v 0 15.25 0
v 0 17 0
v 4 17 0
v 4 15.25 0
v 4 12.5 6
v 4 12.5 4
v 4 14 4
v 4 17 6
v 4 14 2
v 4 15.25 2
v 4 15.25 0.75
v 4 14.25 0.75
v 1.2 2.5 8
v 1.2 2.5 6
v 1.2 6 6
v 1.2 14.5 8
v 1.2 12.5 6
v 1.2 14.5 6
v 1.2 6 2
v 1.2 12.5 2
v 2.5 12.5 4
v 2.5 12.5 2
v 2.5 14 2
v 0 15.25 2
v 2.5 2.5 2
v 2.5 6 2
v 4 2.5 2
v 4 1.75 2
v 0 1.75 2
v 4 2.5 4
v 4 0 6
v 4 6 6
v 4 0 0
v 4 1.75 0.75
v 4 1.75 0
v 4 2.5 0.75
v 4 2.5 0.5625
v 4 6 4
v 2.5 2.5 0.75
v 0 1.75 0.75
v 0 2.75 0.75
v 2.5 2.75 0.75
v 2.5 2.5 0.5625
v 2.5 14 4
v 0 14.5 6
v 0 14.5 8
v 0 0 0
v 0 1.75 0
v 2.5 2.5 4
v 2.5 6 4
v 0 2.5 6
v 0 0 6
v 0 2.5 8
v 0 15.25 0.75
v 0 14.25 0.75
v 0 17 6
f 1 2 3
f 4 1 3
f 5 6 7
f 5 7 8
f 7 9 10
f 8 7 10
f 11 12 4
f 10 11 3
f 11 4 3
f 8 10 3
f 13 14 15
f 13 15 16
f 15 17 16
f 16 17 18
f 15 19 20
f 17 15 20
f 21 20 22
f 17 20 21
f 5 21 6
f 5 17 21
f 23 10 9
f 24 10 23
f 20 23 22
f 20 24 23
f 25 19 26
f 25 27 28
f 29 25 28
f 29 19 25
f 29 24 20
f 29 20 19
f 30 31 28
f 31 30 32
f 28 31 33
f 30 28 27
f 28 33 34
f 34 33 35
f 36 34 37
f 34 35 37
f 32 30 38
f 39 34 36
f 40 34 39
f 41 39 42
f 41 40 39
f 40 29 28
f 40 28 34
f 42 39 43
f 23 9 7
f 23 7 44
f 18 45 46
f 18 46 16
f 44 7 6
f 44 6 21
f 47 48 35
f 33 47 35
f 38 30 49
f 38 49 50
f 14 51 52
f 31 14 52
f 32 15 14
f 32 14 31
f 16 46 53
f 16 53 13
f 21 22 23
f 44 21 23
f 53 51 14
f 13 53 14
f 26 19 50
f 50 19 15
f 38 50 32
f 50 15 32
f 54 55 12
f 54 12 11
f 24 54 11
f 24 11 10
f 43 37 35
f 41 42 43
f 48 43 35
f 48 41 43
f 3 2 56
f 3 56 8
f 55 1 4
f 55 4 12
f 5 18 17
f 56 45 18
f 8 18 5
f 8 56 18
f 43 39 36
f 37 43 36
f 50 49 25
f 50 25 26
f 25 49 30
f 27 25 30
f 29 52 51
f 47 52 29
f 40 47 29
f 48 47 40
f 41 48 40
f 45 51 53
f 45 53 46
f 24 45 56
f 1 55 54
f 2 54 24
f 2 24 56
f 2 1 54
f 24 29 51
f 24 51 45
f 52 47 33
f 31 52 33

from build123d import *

# Parameters (mm, degrees)
SKETCH1_W           = 4
SKETCH1_H           = 17
BOSS_EXTRUDE1_DEPTH = 6
SKETCH2_W           = 2.8
SKETCH2_H           = 6.5
SKETCH2_W_2         = 1.5
SKETCH2_H_2         = 2.75
CUT_EXTRUDE1_DEPTH  = 19.466185313
CUT_EXTRUDE2_DEPTH  = 19.466185313
SKETCH4_W           = 2
SKETCH4_H           = 2.75
BOSS_EXTRUDE2_DEPTH = 2
SKETCH5_W           = 1.2
SKETCH5_H           = 12
BOSS_EXTRUDE3_DEPTH = 2
SKETCH6_W           = 1.5
SKETCH6_H           = 1.5
SKETCH6_H_2         = 0.75
CUT_EXTRUDE3_DEPTH  = 2


with BuildPart() as part:
    # Sketch1 → Boss-Extrude1 (new body)
    with BuildSketch(Plane.XY):
        with Locations((2, 8.5)):
            Rectangle(SKETCH1_W, SKETCH1_H)
    extrude(amount=BOSS_EXTRUDE1_DEPTH)

    # Sketch2 → Cut-Extrude1 (cut, through all)
    with BuildSketch(Plane.XY.offset(6)):
        with Locations((2.6, 9.25)):
            Rectangle(SKETCH2_W, SKETCH2_H)
        with Locations((3.25, 3.875)):
            Rectangle(SKETCH2_W_2, SKETCH2_H_2)
    extrude(amount=-CUT_EXTRUDE1_DEPTH, mode=Mode.SUBTRACT)

    # Sketch3 → Cut-Extrude2 (cut, through all)
    with BuildSketch(Plane.ZY):
        Polygon((0, 15.25), (0.75, 14.25), (0.75, 15.25), (2, 15.25), (2, 1.75), (0.75, 1.75), (0.75, 2.75), (0, 1.75), align=None)
    extrude(amount=-CUT_EXTRUDE2_DEPTH, mode=Mode.SUBTRACT)

    # Sketch4 → Boss-Extrude2 (add)
    with BuildSketch(Plane(origin=(4, 0, 0), x_dir=(0, 0, -1), z_dir=(1, 0, 0))):
        with Locations((-5, 3.875)):
            Rectangle(SKETCH4_W, SKETCH4_H)
    extrude(amount=-BOSS_EXTRUDE2_DEPTH)

    # Sketch5 → Boss-Extrude3 (add)
    with BuildSketch(Plane.XY.offset(6)):
        with Locations((0.6, 8.5)):
            Rectangle(SKETCH5_W, SKETCH5_H)
    extrude(amount=BOSS_EXTRUDE3_DEPTH)

    # Sketch6 → Cut-Extrude3 (cut)
    with BuildSketch(Plane(origin=(0, 0, 2), x_dir=(-1, 0, 0), z_dir=(0, 0, -1))):
        with Locations((-3.25, 13.25)):
            Rectangle(SKETCH6_W, SKETCH6_H)
        with Locations((-3.25, 5.625)):
            Rectangle(SKETCH6_W, SKETCH6_H_2)
    extrude(amount=-CUT_EXTRUDE3_DEPTH, mode=Mode.SUBTRACT)


solid = part.part
